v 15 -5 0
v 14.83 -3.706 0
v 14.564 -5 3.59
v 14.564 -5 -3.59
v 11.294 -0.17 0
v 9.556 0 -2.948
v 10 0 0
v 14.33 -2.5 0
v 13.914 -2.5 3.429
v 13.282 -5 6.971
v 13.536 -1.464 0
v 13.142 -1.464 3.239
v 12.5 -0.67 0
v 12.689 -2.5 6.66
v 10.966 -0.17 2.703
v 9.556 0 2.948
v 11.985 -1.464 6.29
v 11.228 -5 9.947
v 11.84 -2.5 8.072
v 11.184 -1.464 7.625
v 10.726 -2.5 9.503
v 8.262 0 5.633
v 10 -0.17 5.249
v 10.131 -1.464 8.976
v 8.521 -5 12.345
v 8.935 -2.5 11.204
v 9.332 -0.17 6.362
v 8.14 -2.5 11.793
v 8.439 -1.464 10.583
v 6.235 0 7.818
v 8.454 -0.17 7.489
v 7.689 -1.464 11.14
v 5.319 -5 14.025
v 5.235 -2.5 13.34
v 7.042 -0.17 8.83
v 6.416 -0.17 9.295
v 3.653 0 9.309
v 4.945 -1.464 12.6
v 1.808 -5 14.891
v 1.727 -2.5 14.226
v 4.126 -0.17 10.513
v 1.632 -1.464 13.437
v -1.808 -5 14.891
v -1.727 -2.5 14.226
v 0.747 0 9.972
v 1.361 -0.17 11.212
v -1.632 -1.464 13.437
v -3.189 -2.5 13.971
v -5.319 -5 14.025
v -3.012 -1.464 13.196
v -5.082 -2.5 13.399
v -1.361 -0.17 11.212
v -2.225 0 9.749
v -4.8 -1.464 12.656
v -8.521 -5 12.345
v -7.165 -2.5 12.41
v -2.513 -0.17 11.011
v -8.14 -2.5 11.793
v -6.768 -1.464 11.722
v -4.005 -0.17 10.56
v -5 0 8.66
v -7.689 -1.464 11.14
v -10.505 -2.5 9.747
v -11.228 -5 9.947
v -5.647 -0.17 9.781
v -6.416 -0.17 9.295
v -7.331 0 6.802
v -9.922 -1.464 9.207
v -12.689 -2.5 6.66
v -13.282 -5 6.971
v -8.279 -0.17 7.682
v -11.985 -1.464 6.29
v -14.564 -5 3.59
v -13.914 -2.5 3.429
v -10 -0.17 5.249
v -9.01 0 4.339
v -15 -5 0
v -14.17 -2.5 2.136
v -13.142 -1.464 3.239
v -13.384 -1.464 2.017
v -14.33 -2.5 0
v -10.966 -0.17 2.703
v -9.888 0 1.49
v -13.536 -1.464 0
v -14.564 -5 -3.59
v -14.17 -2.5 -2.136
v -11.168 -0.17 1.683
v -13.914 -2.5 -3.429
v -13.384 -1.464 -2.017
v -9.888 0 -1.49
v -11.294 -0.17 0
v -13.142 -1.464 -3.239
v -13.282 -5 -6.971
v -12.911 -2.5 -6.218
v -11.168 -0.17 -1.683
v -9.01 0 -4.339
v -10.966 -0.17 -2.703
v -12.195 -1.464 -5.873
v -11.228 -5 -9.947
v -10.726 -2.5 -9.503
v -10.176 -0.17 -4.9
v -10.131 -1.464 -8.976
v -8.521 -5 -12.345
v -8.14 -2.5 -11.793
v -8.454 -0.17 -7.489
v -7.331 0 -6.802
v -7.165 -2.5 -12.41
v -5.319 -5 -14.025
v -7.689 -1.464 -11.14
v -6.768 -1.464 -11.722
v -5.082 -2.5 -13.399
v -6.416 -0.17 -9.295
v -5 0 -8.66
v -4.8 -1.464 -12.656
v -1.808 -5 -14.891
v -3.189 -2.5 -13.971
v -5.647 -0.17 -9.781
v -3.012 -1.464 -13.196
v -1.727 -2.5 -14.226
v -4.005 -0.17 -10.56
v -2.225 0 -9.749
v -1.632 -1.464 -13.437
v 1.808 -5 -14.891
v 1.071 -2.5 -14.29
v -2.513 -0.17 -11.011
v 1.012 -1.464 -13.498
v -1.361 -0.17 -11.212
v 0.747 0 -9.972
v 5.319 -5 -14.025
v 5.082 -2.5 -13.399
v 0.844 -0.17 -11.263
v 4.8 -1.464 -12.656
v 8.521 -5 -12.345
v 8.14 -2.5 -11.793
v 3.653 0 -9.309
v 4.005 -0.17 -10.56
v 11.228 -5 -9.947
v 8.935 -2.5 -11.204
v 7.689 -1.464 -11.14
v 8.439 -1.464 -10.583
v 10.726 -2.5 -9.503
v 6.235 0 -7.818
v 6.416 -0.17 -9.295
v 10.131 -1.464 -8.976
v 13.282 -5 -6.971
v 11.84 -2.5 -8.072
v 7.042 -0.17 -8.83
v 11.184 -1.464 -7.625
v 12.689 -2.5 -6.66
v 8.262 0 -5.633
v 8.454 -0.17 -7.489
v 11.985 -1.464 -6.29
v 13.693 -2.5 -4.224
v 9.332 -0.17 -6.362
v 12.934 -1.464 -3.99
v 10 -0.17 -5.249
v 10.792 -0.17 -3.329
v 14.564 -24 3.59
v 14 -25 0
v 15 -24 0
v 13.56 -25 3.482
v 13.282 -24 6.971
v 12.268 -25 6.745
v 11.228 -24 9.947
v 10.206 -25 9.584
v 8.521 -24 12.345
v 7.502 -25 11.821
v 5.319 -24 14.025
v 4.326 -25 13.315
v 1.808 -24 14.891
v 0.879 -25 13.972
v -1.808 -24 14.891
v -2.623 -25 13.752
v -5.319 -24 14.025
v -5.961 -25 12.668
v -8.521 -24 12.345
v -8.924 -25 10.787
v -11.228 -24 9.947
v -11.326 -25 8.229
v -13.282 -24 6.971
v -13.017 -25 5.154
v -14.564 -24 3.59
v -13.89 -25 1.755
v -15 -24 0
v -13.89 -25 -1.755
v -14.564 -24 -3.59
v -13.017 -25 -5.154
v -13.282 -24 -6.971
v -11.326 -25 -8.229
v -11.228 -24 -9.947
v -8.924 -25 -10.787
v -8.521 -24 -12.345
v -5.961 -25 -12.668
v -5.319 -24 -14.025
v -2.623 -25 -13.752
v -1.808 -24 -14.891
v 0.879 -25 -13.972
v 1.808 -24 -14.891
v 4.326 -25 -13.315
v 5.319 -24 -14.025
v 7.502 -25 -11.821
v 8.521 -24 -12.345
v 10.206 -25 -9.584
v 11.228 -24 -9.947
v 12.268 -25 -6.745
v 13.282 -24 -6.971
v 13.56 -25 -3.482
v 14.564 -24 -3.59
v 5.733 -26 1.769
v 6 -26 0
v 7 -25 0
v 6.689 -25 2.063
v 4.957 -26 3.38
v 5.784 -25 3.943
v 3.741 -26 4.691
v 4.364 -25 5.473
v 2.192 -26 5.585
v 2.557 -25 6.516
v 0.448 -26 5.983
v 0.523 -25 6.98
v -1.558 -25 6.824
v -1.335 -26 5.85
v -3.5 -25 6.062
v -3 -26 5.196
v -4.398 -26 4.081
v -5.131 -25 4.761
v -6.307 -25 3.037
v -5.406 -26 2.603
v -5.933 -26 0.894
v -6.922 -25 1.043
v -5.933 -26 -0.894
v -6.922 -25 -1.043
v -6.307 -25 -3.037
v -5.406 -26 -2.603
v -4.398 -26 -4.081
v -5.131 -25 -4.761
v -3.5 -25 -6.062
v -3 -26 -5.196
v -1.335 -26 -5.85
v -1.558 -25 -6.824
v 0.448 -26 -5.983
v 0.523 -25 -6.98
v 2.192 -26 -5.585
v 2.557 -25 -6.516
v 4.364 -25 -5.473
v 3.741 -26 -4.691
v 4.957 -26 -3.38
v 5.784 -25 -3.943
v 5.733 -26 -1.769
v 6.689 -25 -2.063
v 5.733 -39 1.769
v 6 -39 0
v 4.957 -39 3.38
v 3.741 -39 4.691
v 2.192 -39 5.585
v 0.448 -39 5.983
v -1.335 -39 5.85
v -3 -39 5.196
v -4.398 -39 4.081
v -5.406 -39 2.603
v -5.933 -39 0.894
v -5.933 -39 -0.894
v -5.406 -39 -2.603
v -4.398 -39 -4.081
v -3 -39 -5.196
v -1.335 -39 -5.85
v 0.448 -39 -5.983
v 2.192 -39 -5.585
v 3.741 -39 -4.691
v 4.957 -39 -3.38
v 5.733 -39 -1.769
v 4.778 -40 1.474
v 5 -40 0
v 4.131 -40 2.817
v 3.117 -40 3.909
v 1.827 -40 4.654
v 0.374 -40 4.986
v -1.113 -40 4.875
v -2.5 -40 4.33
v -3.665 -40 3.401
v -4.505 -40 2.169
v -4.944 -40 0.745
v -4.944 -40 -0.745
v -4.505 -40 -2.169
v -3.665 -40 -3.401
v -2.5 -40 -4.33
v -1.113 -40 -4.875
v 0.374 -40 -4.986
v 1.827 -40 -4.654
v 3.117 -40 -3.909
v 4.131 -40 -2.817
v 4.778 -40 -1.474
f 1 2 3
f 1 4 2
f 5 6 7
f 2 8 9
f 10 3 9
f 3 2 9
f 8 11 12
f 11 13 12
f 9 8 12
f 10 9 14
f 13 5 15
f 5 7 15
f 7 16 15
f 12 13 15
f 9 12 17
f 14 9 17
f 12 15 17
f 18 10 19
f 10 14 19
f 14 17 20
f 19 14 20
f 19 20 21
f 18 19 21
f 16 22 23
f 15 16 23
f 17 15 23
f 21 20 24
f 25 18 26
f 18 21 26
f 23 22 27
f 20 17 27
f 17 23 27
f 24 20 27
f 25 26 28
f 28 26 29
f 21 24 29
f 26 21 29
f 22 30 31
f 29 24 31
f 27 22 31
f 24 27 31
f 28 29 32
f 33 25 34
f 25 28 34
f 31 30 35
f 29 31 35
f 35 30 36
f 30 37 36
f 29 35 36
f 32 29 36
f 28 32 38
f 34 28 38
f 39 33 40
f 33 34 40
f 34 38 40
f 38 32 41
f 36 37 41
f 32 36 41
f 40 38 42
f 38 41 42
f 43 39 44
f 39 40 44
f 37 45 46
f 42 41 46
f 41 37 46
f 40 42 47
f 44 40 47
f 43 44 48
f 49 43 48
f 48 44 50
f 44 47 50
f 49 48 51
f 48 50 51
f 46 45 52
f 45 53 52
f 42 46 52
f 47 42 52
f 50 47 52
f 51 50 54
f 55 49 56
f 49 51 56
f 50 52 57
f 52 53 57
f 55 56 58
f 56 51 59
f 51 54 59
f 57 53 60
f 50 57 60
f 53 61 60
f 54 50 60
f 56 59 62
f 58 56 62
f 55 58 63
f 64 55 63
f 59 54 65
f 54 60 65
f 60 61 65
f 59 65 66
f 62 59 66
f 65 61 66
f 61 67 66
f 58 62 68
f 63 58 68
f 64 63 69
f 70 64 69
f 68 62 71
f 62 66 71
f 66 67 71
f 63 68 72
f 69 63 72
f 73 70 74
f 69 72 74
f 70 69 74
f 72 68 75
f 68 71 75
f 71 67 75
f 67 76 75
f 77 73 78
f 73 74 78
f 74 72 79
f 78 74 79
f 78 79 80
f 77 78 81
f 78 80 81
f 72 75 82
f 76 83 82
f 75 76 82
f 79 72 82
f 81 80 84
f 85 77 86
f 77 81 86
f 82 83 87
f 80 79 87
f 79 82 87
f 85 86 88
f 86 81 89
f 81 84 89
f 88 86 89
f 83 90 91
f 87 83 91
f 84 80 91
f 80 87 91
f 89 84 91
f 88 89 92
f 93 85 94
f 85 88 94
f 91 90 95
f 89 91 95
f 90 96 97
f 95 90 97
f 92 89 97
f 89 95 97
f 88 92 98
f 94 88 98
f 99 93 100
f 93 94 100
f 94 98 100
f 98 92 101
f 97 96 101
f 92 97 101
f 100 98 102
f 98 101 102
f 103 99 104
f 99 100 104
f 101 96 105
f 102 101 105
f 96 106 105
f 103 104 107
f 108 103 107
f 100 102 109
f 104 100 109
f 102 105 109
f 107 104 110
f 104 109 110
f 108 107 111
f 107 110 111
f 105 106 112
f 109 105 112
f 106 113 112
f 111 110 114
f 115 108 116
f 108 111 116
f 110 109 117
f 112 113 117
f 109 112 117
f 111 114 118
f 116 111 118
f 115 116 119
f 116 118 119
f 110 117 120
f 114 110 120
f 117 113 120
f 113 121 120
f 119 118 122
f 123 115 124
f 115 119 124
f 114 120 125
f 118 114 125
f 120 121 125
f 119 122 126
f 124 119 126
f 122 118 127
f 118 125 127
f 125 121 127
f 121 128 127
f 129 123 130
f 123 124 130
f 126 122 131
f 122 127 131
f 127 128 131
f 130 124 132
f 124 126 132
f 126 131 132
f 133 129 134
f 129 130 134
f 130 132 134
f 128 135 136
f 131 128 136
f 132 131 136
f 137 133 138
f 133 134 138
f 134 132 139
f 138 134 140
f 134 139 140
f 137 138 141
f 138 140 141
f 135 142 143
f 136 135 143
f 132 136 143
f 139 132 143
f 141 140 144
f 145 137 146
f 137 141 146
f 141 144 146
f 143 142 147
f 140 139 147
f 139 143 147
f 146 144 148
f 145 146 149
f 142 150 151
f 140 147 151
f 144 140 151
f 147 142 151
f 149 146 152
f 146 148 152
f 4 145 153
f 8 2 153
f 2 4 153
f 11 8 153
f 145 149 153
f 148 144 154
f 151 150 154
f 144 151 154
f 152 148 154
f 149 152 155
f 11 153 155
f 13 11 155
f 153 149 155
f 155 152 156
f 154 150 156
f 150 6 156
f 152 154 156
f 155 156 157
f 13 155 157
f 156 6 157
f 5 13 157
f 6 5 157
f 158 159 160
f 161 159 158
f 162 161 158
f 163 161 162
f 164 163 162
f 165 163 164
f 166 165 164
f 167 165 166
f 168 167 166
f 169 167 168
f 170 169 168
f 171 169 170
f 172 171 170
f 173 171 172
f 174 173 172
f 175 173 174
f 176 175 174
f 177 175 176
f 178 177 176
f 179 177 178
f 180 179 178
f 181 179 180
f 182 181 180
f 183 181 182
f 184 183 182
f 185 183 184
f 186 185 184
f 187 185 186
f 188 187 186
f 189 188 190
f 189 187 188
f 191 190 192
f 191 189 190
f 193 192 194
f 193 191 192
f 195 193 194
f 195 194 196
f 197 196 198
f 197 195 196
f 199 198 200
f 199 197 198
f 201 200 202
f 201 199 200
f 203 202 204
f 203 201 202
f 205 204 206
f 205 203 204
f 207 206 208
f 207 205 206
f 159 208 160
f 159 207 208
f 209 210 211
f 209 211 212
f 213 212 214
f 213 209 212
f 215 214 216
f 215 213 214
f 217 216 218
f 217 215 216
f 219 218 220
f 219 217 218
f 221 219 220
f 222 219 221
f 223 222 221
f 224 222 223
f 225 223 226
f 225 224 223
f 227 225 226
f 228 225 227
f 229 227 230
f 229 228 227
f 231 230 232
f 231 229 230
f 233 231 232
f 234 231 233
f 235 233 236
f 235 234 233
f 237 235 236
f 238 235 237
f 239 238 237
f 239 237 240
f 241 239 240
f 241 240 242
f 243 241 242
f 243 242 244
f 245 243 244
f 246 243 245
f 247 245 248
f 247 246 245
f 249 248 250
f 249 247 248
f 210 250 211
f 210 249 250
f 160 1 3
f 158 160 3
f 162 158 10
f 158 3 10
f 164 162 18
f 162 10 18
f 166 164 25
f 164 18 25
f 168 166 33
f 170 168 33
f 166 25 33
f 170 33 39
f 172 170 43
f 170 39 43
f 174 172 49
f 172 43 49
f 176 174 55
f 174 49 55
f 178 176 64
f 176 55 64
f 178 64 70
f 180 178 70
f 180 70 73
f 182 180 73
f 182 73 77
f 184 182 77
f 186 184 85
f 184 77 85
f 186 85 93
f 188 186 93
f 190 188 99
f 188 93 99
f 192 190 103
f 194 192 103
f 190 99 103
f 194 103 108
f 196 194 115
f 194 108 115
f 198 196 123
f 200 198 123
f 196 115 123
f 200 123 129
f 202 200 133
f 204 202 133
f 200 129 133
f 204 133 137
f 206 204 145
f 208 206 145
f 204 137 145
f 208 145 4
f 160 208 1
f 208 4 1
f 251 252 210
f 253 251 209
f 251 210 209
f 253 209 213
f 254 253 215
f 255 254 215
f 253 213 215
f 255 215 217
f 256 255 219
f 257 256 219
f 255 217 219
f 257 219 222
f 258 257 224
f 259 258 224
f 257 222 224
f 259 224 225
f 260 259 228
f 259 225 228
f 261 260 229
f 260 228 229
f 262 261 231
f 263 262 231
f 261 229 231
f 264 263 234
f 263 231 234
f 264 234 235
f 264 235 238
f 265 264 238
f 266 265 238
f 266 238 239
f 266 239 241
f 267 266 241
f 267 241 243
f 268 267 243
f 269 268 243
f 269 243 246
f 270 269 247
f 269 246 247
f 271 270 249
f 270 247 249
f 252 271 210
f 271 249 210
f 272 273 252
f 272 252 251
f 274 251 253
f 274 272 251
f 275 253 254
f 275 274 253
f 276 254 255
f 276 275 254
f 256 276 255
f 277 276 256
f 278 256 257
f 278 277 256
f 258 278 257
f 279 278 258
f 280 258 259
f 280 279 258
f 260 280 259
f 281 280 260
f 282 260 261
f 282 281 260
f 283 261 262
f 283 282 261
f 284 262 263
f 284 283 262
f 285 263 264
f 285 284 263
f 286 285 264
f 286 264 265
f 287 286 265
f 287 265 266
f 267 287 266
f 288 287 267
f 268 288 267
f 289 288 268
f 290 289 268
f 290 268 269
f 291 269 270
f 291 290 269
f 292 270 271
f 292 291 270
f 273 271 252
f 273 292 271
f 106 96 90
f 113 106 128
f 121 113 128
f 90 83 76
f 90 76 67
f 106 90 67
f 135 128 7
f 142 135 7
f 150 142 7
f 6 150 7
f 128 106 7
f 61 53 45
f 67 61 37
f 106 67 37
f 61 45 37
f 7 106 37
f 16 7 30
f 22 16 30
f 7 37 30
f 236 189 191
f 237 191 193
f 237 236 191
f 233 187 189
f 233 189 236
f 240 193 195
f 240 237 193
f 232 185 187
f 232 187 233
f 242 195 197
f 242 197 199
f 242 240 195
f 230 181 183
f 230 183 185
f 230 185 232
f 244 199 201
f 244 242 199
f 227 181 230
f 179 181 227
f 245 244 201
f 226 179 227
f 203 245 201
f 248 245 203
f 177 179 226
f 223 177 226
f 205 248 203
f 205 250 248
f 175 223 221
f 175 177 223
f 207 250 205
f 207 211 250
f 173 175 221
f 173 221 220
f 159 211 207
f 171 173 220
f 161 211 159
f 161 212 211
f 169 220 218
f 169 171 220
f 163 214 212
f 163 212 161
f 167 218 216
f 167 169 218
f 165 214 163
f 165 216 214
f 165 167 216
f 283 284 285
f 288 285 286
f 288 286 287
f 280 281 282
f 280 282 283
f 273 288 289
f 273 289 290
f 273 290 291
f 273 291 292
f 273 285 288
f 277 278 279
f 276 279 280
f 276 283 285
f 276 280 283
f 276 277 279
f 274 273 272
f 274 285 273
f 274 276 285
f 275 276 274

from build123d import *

# Parameters (mm, degrees)
F0_R     = 15
F1_DEPTH = 25
F2_R     = 6
F3_DEPTH = 15
F4_R     = 5
F5_SIZE  = 1


with BuildPart() as f1:
    # F0 (on Front) → F1 (new body)
    with BuildSketch(Plane.XZ):
        Circle(F0_R)
    extrude(amount=F1_DEPTH)

    # F2 (on face) → F3 (join)
    with BuildSketch(Plane.XZ.offset(25)):
        Circle(F2_R)
    extrude(amount=F3_DEPTH)

    # F4
    f4_edges = [f1.edges().sort_by_distance(p)[0] for p in [
        (-15, 0, 0),
    ]]
    fillet(f4_edges, radius=F4_R)

    # F5
    f5_edges = [f1.edges().sort_by_distance(p)[0] for p in [
        (-6, -40, 0),
        (-6, -25, 0),
        (-15, -25, 0),
    ]]
    chamfer(f5_edges, length=F5_SIZE)


solid = f1.part
